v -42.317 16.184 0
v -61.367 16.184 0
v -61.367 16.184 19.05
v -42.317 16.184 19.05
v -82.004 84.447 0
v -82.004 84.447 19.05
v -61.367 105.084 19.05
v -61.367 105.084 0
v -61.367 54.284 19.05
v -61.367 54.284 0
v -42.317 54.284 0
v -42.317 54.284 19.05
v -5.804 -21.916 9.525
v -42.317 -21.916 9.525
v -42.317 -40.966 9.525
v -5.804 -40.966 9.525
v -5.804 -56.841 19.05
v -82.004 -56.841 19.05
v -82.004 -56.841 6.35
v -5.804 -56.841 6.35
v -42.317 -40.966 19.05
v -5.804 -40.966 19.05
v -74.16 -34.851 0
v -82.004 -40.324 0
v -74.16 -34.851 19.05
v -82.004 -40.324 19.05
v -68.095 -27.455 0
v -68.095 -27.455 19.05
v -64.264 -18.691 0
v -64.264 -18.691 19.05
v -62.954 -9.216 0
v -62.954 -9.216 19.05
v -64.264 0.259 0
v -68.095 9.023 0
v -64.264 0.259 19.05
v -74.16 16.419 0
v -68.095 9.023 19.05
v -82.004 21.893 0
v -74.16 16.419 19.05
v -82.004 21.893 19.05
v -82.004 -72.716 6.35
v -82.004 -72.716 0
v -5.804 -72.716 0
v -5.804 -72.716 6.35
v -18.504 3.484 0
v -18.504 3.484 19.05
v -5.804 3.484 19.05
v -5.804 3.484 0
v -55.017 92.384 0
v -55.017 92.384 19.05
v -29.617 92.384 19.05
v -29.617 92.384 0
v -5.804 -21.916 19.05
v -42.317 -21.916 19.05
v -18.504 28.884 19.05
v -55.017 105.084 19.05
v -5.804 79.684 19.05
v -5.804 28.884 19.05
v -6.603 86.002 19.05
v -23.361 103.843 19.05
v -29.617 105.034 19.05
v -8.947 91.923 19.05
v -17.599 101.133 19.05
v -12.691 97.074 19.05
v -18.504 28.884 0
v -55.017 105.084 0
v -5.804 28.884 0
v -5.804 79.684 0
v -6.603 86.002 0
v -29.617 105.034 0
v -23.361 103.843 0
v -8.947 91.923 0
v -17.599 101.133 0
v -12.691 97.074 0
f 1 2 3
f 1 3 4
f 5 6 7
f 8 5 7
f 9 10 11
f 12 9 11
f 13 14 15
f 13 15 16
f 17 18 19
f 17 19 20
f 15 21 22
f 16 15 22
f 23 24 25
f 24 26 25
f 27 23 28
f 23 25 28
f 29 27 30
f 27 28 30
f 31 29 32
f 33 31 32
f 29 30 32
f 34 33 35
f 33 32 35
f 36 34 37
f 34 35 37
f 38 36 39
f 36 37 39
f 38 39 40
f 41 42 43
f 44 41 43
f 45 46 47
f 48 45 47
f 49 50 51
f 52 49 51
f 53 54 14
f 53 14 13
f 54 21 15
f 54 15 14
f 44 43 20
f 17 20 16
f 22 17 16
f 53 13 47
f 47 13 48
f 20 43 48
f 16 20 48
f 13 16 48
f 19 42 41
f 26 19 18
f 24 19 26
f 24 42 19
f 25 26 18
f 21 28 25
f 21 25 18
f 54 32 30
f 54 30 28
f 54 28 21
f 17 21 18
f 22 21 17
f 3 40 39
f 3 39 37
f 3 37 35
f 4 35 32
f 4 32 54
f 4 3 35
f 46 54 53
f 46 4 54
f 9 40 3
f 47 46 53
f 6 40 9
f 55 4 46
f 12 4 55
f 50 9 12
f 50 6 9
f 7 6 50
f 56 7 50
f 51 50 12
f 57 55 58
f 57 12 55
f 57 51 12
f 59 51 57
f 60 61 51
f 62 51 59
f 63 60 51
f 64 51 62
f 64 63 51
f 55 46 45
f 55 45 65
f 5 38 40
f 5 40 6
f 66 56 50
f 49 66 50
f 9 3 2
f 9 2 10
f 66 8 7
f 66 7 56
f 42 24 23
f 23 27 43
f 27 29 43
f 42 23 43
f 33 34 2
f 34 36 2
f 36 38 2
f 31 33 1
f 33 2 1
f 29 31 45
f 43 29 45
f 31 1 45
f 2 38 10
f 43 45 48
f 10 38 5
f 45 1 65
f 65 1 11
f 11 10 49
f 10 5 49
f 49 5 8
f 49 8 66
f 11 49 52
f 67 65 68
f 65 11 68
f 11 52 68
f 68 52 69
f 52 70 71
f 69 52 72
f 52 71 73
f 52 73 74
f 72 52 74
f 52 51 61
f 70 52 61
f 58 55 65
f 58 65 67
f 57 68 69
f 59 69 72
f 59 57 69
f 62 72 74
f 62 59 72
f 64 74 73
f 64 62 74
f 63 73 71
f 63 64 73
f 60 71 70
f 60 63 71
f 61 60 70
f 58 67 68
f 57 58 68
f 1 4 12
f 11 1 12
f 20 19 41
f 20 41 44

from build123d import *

# Parameters (mm, degrees)
F0_W      = 76.2
F0_H      = 177.8
F1_DEPTH  = 19.05
F2_R      = 25.4
F4_DEPTH  = 25.4
F6_DEPTH  = 25.4
F7_W      = 76.2
F7_H      = 15.875
F8_DEPTH  = 12.7
F9_W      = 36.5125
F9_H      = 19.05
F10_DEPTH = 9.525
F11_W     = 12.7
F11_H     = 25.4
F12_DEPTH = 25.4
F13_R     = 34.925
F14_DEPTH = 25.4
F15_W     = 19.05
F15_H     = 38.1
F16_DEPTH = 25.4


with BuildPart() as f1:
    # F0 (on Top) → F1 (new body)
    with BuildSketch(Plane.XY):
        with Locations((-43.904473, 16.184047)):
            Rectangle(F0_W, F0_H)
    extrude(amount=F1_DEPTH)

    # F2
    f2_edges = [f1.edges().sort_by_distance(p)[0] for p in [
        (-5.804473, 105.084047, 9.525),
    ]]
    fillet(f2_edges, radius=F2_R)

    # F3 (on face) → F4 (cut)
    with BuildSketch(Plane.XY.offset(19.05)):
        Polygon((-61.366973, 105.084047), (-82.004473, 105.084047), (-82.004473, 84.446547), align=None)
    extrude(amount=-F4_DEPTH, mode=Mode.SUBTRACT)

    # F5 (on face) → F6 (cut)
    with BuildSketch(Plane.XY.offset(19.05)):
        with BuildLine():
            Line((-31.204473, 105.084047), (-55.016973, 105.084047))
            Line((-55.016973, 105.084047), (-55.016973, 92.384047))
            Line((-55.016973, 92.384047), (-29.616973, 92.384047))
            Line((-29.616973, 92.384047), (-29.616973, 105.034389))
            ThreePointArc((-29.616973, 105.034389), (-30.410334, 105.071629), (-31.204473, 105.084047))
        make_face()
    extrude(amount=-F6_DEPTH, mode=Mode.SUBTRACT)

    # F7 (on face) → F8 (cut)
    with BuildSketch(Plane.XY.offset(19.05)):
        with Locations((-43.904473, -64.778453)):
            Rectangle(F7_W, F7_H)
    extrude(amount=-F8_DEPTH, mode=Mode.SUBTRACT)

    # F9 (on face) → F10 (cut)
    with BuildSketch(Plane.XY.offset(19.05)):
        with Locations((-24.060723, -31.440953)):
            Rectangle(F9_W, F9_H)
    extrude(amount=-F10_DEPTH, mode=Mode.SUBTRACT)

    # F11 (on face) → F12 (cut)
    with BuildSketch(Plane.XY.offset(19.05)):
        with Locations((-12.154473, 16.184047)):
            Rectangle(F11_W, F11_H)
    extrude(amount=-F12_DEPTH, mode=Mode.SUBTRACT)

    # F13 (on face) → F14 (cut)
    with BuildSketch(Plane.XY.offset(19.05)):
        with Locations((-97.879473, -9.215953)):
            Circle(F13_R)
    extrude(amount=-F14_DEPTH, mode=Mode.SUBTRACT)

    # F15 (on face) → F16 (cut)
    with BuildSketch(Plane.XY.offset(19.05)):
        with Locations((-51.841973, 35.234047)):
            Rectangle(F15_W, F15_H)
    extrude(amount=-F16_DEPTH, mode=Mode.SUBTRACT)


solid = f1.part
